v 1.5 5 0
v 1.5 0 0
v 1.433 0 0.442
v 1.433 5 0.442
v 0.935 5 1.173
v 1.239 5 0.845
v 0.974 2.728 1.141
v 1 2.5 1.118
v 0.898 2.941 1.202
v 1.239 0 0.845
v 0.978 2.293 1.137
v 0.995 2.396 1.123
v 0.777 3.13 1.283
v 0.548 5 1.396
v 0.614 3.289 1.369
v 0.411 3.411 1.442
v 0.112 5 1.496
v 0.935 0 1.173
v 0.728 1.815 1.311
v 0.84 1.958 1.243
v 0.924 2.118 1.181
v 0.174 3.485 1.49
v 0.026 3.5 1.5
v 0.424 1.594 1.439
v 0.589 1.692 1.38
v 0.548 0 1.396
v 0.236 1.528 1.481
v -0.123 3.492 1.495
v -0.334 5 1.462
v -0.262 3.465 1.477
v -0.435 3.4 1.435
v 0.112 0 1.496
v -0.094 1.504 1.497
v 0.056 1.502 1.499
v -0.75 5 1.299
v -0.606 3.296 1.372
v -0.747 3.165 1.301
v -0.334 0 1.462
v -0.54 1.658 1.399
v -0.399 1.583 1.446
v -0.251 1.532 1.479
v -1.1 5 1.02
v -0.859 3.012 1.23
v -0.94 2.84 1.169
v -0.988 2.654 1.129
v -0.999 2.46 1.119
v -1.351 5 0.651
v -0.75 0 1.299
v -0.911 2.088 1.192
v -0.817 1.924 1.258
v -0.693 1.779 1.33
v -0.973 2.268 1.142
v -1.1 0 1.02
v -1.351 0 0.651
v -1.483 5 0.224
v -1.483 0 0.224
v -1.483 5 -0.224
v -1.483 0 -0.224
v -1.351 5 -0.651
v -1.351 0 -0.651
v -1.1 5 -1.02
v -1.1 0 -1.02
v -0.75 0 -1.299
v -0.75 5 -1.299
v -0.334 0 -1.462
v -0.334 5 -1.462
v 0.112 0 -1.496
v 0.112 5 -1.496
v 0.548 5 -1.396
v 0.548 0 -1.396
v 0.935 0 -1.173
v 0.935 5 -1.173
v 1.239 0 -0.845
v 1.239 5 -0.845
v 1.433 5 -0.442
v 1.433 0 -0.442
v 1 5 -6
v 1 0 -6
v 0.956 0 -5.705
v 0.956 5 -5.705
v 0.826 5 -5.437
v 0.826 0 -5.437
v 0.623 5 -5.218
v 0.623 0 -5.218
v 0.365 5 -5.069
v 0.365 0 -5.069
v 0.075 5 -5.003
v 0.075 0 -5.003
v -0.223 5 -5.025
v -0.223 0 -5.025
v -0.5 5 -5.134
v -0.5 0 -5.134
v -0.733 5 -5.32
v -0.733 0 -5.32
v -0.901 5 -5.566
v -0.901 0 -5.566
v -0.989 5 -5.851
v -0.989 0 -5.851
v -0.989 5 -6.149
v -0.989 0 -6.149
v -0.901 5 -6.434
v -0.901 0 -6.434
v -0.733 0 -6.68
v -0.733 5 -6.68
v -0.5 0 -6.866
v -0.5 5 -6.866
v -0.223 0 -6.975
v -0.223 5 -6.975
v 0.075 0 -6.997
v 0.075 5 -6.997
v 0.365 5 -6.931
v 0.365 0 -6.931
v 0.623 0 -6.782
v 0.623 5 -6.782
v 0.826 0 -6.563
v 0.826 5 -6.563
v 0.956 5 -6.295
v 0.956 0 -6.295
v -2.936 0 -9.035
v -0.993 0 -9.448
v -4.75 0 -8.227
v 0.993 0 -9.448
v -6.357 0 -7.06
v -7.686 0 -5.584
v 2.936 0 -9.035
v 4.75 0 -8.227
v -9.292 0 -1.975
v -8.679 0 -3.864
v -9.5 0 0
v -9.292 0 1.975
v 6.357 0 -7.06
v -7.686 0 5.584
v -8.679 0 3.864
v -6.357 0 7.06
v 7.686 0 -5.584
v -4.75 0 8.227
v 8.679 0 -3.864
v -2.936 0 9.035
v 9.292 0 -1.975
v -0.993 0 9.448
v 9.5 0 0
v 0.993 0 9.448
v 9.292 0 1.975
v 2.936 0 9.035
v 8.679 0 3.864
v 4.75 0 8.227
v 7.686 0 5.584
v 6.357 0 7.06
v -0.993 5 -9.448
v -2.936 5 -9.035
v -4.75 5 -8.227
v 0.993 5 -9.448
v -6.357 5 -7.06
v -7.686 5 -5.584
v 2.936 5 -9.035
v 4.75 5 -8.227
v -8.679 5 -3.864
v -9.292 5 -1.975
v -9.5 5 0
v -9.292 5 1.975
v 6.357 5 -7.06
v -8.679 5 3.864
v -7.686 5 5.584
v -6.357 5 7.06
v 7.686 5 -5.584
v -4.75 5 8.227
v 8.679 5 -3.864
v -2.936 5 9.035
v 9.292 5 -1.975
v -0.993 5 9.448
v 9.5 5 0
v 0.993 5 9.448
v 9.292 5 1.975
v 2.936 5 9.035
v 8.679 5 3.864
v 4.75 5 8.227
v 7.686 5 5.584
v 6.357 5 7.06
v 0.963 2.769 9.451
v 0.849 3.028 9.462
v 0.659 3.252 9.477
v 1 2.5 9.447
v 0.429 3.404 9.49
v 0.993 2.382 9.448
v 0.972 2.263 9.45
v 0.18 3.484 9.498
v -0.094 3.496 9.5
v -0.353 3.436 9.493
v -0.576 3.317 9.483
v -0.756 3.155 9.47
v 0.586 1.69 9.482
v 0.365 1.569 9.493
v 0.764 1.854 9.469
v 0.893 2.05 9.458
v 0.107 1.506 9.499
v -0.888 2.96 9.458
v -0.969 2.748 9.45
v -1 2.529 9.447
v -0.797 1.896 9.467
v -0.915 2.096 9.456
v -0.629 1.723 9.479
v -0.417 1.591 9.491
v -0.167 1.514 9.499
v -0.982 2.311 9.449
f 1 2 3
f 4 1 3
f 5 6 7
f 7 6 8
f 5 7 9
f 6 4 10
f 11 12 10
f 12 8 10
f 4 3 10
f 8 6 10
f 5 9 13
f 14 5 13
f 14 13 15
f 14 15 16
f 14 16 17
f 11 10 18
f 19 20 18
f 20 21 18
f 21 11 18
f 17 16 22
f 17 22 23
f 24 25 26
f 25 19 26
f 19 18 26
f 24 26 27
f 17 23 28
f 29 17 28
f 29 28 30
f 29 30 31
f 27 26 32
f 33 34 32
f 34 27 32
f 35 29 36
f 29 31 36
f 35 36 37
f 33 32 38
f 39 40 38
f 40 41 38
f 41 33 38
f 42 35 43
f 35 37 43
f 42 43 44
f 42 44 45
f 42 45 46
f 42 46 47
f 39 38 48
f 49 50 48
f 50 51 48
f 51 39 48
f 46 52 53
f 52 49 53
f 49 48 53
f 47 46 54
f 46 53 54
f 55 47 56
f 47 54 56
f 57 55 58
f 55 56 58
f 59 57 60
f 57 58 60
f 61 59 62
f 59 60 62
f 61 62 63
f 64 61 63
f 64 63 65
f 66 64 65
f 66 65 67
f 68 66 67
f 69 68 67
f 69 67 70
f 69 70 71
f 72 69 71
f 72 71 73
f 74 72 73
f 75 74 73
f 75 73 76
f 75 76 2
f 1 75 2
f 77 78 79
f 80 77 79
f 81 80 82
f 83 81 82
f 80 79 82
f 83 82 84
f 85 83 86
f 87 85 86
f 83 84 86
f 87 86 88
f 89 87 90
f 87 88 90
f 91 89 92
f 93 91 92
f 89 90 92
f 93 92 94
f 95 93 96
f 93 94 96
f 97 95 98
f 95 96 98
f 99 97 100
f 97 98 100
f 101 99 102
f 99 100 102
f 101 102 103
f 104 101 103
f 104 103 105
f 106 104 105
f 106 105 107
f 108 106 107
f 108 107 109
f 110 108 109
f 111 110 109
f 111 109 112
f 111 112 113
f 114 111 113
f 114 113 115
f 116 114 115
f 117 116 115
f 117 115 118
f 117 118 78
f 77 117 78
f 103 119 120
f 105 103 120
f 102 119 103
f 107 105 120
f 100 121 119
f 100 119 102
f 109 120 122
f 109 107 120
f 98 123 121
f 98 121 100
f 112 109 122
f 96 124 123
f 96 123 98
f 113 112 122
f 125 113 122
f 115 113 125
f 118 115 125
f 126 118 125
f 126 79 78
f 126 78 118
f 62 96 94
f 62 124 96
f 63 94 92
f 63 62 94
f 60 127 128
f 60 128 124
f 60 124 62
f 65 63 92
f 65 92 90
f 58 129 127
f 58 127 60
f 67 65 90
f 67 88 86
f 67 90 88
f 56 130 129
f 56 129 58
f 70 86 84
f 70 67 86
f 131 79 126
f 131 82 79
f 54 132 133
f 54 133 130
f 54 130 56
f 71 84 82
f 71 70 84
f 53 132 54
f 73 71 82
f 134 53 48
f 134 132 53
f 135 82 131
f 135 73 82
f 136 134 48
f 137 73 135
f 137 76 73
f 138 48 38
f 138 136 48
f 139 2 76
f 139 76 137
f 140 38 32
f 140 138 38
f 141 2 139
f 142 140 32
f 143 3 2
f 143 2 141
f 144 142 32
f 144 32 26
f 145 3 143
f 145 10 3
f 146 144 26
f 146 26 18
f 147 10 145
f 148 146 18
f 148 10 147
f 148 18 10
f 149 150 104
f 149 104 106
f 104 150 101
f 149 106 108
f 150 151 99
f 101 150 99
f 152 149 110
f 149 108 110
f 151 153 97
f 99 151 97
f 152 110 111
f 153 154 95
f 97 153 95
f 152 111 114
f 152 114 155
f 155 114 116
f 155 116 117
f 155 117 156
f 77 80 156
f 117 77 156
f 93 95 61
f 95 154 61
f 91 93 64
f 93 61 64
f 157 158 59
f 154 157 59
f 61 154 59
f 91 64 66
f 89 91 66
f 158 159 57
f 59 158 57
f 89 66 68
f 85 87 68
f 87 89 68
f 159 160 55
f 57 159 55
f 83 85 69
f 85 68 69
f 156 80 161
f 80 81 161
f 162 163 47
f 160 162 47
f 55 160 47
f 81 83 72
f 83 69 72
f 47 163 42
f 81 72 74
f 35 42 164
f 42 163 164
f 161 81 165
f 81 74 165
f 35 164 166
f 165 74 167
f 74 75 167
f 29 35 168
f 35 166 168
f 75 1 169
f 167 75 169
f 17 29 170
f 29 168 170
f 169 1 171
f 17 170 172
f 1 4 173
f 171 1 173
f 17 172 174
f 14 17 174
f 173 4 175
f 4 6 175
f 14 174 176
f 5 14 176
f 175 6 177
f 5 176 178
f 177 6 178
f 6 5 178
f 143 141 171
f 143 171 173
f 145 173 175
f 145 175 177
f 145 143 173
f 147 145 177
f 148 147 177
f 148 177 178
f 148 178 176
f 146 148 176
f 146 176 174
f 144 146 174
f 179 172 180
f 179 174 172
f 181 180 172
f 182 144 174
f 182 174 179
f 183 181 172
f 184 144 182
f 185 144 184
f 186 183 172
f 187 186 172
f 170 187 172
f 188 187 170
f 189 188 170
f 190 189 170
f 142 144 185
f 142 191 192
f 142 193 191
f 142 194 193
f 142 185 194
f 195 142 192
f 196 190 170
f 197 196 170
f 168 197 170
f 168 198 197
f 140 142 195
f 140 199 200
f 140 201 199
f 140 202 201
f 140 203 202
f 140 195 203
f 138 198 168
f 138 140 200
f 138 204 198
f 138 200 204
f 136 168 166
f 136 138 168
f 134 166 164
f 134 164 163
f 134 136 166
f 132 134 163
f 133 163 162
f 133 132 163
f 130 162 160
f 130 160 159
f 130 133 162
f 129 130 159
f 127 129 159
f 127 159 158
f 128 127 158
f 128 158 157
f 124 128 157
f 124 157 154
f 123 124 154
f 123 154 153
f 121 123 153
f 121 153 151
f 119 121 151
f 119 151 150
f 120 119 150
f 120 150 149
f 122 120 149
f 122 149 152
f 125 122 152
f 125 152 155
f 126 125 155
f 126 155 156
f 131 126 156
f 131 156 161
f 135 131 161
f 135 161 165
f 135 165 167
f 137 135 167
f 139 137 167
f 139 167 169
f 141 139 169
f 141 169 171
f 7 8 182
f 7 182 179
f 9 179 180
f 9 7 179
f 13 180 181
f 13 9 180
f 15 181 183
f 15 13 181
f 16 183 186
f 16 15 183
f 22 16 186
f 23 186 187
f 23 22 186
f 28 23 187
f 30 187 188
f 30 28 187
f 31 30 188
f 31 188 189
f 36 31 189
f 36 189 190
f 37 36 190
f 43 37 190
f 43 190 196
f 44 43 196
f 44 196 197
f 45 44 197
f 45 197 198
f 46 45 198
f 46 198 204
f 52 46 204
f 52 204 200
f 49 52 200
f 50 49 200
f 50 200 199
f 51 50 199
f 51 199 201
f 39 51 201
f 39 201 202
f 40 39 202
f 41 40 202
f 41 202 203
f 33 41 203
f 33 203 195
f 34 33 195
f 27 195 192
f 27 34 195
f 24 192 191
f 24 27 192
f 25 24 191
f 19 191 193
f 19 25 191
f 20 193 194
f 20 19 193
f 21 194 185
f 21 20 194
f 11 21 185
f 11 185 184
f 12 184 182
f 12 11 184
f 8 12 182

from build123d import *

# Parameters (mm, degrees)
F0_R     = 9.5
F1_DEPTH = 5
F2_R     = 1.5
F2_R_2   = 1
F3_DEPTH = 5.001
F4_R     = 1
F5_DEPTH = 25


with BuildPart() as f1:
    # F0 (on Front) → F1 (new body)
    with BuildSketch(Plane.XZ):
        Circle(F0_R)
    extrude(amount=-F1_DEPTH)

    # F2 (on face) → F3 (cut, through all)
    with BuildSketch(Plane.XZ):
        Circle(F2_R)
        with Locations((0, -6)):
            Circle(F2_R_2)
    extrude(amount=-F3_DEPTH, mode=Mode.SUBTRACT)

    # F4 (on Top) → F5 (cut)
    with BuildSketch(Plane.XY):
        with Locations((0, 2.5)):
            Circle(F4_R)
    extrude(amount=F5_DEPTH, mode=Mode.SUBTRACT)


solid = f1.part
